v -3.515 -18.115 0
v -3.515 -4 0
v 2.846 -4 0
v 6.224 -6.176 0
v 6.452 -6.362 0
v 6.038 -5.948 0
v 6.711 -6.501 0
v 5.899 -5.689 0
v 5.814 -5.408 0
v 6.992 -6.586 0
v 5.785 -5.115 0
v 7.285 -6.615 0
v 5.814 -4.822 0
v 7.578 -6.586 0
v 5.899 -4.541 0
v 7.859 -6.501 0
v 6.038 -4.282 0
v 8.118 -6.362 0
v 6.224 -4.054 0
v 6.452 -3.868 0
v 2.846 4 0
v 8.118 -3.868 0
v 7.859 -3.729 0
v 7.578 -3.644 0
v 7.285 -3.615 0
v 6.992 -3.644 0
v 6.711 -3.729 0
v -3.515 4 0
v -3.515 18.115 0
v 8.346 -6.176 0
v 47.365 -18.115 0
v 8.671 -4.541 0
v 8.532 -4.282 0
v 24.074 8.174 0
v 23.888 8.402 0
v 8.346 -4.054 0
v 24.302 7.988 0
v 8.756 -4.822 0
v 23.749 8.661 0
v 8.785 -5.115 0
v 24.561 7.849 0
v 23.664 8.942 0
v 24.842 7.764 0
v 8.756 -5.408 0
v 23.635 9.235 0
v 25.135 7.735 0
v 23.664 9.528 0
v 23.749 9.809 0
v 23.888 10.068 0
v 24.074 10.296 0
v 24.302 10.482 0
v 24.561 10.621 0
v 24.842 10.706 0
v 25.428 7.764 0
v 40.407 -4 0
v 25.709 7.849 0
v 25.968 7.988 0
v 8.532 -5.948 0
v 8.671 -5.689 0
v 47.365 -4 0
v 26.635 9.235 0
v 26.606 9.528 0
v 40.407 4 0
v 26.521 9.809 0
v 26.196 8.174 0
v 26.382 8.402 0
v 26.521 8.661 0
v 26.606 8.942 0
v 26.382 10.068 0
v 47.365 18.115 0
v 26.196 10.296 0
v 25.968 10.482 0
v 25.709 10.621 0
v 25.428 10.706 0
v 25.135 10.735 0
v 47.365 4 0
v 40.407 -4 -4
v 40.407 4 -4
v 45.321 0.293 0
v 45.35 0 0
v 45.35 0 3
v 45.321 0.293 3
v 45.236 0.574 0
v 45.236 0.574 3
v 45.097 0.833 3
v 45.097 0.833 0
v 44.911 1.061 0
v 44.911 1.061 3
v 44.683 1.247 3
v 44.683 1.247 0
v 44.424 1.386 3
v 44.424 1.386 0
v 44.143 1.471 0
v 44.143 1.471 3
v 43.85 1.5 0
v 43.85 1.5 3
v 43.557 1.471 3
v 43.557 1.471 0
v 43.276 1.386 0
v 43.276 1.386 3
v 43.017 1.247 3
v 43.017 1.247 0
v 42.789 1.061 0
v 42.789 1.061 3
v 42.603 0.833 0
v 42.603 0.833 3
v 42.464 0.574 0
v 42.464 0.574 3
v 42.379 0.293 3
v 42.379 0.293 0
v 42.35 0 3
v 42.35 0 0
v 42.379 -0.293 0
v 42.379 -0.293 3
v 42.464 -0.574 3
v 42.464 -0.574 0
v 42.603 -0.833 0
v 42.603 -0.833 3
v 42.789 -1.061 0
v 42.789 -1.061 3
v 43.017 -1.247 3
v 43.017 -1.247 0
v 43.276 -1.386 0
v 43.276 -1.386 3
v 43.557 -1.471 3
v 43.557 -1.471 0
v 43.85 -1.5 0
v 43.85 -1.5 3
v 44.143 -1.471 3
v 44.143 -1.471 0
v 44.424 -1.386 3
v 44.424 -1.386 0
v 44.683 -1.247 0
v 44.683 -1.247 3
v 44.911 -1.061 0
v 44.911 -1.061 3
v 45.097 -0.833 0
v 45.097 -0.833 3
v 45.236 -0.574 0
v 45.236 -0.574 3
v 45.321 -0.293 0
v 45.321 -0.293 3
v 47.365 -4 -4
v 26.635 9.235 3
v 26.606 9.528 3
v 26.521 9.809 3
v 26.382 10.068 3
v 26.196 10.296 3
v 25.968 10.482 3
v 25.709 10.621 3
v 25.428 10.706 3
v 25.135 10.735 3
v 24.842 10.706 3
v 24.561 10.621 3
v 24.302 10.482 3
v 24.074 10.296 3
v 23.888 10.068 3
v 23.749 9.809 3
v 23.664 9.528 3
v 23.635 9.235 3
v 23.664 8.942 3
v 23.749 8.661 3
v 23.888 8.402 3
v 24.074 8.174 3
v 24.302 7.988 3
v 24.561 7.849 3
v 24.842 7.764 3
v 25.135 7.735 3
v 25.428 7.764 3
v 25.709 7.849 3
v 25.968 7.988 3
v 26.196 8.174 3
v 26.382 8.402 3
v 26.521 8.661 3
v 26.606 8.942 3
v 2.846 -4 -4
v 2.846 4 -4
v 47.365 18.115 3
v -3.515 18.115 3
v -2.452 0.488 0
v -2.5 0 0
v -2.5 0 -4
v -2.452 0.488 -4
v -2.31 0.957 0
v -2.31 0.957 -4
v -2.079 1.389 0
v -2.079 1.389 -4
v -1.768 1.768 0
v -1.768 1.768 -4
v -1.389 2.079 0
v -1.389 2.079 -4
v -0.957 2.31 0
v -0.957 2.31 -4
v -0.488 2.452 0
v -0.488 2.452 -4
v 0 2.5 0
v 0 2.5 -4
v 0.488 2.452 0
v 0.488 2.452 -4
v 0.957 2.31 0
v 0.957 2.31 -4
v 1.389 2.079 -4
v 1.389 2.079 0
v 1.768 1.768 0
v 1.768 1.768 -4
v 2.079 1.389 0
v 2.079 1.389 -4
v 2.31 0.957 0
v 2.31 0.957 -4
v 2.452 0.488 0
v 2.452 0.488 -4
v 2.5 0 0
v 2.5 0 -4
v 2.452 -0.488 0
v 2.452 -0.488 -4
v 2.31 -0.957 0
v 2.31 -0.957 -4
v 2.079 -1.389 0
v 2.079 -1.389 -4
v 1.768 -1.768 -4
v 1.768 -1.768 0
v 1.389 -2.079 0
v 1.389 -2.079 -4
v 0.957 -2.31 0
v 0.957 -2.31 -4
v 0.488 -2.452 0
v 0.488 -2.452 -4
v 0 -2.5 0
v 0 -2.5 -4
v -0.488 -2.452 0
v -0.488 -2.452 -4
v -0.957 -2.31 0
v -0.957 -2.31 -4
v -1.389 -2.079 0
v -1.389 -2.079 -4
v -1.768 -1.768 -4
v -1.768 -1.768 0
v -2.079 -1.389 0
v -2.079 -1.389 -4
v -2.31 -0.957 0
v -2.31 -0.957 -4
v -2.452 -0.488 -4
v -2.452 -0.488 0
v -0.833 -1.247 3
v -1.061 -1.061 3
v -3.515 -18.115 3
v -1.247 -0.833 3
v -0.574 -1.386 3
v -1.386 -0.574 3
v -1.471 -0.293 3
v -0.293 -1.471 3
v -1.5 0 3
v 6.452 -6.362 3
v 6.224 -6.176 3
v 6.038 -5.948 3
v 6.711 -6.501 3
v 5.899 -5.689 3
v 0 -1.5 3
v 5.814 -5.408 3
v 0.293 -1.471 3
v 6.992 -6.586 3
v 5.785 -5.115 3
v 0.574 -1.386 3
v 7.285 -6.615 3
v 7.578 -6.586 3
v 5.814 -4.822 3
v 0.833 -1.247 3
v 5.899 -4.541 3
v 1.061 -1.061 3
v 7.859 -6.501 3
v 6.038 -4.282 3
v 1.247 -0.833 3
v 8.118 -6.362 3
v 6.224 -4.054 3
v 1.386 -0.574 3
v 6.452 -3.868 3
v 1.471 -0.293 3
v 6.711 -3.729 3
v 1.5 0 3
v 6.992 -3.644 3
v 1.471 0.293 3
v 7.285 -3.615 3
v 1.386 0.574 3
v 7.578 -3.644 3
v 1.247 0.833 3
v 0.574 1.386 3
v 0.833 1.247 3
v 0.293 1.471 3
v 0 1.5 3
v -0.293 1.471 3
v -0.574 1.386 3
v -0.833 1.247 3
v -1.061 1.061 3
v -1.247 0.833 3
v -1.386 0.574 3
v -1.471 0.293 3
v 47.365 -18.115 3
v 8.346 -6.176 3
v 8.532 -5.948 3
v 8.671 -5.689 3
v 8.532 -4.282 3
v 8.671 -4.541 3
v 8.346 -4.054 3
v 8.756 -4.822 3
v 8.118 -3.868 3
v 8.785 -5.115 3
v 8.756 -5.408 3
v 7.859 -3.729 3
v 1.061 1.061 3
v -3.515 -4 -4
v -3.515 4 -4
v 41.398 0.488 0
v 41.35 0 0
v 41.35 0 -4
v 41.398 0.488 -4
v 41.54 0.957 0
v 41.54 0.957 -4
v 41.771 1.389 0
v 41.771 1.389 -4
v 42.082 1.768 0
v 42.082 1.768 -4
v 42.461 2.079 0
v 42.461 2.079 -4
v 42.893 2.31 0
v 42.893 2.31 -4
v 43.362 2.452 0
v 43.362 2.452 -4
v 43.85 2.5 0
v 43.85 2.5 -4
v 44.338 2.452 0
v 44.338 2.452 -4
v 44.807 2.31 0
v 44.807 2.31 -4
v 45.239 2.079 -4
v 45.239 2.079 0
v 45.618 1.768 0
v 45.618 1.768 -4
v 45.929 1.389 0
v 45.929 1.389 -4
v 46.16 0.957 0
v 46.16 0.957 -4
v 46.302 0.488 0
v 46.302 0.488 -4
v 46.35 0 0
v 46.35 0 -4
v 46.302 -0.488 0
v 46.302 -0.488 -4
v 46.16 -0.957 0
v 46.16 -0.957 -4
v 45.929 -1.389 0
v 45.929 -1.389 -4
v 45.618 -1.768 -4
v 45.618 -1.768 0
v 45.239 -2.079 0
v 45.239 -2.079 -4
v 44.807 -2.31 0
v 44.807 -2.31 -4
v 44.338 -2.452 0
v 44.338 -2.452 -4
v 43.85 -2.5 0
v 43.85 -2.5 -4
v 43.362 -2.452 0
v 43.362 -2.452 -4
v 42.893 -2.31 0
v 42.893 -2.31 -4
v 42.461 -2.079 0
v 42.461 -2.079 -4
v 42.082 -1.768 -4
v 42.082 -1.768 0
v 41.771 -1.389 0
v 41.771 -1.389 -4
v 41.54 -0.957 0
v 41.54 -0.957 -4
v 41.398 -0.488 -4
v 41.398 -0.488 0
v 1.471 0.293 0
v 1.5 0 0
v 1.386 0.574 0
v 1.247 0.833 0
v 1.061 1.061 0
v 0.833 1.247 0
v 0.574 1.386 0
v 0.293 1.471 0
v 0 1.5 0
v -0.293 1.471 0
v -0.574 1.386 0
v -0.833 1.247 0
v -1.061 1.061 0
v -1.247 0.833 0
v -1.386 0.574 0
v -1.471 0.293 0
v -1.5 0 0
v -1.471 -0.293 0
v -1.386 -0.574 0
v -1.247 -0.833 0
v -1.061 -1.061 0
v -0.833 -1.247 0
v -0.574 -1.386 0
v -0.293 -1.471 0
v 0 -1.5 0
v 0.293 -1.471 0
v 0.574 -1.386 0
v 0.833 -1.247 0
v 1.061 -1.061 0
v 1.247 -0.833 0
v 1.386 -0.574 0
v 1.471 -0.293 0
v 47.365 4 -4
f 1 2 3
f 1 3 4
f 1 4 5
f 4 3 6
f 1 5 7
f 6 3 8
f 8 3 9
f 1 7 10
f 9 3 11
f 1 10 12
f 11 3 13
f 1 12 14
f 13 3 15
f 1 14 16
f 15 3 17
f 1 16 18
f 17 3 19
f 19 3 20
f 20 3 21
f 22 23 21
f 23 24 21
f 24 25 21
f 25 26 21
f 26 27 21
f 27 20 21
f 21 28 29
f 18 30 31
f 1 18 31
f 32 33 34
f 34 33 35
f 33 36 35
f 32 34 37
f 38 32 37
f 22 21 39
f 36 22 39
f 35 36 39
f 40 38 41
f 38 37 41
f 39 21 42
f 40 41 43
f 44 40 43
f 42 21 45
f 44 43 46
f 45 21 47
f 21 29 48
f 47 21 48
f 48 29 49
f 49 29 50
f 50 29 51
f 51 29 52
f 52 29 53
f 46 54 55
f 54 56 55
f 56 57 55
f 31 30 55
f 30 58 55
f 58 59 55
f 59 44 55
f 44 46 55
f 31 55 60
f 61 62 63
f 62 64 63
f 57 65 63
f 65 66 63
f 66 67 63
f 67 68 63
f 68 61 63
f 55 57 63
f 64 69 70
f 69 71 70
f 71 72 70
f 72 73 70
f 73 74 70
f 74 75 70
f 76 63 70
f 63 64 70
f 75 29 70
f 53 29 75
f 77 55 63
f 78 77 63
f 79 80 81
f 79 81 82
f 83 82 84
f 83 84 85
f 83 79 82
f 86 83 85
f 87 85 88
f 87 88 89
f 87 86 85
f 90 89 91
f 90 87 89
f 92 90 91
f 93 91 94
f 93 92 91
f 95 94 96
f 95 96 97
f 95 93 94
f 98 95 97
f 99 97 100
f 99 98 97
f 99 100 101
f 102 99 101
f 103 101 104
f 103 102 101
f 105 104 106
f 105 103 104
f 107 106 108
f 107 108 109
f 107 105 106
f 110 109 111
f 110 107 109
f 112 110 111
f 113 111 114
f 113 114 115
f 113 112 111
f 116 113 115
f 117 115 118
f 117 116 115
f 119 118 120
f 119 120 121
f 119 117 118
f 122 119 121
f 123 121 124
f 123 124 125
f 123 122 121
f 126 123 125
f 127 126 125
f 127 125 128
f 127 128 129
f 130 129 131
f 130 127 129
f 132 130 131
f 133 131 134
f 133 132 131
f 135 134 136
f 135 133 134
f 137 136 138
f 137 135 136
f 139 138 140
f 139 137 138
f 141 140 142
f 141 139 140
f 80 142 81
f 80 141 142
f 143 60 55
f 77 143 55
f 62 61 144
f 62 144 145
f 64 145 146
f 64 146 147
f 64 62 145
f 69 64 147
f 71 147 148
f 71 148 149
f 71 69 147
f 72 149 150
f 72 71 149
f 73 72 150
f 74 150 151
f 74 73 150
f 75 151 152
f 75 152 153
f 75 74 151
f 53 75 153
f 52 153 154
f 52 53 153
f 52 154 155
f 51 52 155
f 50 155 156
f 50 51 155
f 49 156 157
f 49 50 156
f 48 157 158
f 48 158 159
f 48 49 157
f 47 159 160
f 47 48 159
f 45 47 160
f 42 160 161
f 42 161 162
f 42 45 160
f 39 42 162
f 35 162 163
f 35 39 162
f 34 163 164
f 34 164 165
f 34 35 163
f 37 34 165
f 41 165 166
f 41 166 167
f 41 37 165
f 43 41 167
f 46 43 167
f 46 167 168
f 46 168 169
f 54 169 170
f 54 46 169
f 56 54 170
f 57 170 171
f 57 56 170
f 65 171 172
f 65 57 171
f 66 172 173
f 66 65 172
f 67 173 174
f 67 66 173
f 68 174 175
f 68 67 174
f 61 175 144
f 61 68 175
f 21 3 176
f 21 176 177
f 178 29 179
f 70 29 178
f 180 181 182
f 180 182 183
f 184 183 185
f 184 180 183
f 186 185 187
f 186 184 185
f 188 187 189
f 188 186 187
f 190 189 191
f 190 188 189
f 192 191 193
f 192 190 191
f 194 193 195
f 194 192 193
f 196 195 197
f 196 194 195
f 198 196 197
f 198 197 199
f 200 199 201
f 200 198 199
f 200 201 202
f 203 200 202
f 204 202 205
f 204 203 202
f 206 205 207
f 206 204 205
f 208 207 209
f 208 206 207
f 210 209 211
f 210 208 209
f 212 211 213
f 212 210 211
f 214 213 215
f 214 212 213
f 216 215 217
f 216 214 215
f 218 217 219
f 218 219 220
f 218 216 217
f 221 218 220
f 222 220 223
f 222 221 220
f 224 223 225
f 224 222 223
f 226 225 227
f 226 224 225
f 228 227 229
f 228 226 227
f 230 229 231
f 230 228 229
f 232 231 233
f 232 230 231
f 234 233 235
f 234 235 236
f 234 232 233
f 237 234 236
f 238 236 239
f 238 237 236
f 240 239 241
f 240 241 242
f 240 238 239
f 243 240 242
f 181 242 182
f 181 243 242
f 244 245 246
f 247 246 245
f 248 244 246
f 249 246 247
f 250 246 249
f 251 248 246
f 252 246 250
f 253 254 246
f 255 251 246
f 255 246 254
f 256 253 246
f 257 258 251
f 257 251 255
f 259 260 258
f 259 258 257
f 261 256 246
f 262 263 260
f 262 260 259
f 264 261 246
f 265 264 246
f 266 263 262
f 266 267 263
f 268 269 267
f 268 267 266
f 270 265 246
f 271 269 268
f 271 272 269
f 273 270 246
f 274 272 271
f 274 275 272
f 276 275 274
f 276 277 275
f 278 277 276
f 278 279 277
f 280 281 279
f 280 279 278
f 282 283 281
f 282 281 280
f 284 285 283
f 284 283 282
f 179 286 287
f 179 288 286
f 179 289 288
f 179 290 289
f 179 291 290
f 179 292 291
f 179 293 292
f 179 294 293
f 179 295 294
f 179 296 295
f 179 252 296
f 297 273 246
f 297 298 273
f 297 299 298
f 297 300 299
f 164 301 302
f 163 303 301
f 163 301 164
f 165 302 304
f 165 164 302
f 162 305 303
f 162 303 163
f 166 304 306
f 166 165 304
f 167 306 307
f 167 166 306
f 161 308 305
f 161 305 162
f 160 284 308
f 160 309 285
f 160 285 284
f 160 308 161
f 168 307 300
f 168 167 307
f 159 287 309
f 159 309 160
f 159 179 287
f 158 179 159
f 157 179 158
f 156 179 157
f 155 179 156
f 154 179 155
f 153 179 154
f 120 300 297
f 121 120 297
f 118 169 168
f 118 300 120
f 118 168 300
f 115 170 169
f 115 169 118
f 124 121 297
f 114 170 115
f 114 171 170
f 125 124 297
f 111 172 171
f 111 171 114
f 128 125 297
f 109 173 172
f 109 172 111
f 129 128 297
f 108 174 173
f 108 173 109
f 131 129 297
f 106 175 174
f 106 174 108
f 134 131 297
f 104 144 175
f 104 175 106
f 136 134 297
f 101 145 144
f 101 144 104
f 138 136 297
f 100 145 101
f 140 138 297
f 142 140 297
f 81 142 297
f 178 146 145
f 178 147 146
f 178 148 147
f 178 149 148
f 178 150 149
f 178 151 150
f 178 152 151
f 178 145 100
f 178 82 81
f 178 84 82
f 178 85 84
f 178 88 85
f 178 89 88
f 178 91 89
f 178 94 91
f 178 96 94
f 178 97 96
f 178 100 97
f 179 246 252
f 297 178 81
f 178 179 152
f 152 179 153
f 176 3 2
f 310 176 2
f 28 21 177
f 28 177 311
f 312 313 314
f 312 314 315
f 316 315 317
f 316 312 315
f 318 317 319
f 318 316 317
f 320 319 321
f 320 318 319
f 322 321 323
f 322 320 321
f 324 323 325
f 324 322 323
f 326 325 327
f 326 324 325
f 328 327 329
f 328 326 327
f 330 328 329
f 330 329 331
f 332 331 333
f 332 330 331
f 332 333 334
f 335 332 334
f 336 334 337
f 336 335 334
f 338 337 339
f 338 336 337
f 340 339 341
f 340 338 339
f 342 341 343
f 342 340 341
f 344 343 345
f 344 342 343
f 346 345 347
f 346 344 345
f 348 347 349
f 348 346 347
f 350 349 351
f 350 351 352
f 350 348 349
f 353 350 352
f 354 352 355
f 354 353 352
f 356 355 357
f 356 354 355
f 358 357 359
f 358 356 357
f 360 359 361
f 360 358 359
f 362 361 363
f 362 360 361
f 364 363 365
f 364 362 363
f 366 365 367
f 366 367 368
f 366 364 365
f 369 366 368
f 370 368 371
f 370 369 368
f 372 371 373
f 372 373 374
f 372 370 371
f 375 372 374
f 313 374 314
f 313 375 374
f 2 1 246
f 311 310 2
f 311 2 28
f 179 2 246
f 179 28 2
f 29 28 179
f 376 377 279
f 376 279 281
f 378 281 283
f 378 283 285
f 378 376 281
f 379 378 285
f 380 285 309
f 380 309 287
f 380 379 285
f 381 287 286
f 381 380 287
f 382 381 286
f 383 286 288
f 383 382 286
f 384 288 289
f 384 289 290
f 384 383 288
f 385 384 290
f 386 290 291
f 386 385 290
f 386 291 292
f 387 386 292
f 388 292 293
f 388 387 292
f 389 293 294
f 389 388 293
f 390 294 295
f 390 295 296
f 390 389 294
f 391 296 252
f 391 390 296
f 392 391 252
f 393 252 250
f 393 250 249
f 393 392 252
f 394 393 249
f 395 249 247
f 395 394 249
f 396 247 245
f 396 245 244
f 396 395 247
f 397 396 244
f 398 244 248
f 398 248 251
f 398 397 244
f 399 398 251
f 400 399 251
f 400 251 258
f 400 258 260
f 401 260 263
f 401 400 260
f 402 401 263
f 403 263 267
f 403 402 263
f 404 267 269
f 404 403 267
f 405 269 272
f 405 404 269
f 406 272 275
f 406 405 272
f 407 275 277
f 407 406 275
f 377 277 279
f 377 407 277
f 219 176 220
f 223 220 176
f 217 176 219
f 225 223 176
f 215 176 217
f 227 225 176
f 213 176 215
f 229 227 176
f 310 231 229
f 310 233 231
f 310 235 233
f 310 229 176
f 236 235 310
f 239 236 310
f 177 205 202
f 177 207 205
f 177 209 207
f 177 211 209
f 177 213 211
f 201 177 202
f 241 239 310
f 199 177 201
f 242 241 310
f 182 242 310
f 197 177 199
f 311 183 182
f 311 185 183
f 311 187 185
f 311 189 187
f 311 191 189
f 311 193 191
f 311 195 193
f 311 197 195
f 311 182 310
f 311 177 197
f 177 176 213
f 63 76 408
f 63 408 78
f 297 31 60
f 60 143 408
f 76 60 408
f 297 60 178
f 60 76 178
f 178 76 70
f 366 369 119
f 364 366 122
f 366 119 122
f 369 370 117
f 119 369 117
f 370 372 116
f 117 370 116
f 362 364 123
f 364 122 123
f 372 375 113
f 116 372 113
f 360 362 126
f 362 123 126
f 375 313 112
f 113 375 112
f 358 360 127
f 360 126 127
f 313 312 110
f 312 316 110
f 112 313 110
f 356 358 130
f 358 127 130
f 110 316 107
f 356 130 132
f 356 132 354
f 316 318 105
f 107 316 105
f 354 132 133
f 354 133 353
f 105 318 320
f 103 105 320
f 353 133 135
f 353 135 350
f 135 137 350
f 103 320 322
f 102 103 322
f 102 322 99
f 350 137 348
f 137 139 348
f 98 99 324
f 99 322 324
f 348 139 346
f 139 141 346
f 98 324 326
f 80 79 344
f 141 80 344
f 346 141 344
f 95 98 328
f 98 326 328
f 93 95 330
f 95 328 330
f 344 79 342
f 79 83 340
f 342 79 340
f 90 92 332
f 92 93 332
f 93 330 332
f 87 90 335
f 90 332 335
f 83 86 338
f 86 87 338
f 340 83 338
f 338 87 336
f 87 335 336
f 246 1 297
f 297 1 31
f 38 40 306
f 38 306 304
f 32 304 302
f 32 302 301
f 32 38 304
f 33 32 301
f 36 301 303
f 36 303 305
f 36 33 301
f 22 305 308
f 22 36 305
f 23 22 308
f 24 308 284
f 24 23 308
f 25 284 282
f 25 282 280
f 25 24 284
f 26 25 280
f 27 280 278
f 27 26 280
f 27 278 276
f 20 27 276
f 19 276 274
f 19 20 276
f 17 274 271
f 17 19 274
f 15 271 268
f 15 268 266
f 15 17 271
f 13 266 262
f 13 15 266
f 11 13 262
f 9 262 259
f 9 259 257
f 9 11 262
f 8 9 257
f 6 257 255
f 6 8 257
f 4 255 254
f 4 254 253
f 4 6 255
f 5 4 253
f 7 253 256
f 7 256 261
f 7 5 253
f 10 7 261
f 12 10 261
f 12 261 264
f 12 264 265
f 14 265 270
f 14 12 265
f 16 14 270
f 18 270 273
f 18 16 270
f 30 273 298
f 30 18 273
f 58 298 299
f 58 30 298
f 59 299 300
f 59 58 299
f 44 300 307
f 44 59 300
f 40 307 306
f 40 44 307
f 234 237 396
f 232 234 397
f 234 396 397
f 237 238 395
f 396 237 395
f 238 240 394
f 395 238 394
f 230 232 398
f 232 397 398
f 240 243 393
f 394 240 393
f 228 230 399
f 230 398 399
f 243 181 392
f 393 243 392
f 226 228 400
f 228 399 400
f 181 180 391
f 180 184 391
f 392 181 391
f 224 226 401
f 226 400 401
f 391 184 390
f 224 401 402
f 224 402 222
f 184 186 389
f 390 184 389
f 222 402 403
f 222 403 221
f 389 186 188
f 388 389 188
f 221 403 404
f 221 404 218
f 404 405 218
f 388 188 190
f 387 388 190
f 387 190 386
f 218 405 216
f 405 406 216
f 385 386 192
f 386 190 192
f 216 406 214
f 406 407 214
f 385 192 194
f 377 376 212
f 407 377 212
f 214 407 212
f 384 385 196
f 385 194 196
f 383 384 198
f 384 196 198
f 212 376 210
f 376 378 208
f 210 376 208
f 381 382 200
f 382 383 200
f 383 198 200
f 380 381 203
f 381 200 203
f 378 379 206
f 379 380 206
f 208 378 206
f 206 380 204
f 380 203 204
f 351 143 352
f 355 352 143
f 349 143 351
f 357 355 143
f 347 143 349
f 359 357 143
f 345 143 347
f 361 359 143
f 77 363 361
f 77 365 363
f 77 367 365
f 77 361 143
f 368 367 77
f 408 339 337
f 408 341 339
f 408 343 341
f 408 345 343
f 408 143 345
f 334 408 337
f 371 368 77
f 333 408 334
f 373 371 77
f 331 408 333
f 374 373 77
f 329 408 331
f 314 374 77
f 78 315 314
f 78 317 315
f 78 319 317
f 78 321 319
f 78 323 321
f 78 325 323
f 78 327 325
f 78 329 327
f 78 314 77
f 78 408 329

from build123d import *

# Parameters (mm, degrees)
SKETCH_1_W      = 50.88
SKETCH_1_H      = 36.23
SKETCH_1_R      = 1.5
EXTRUDE_1_DEPTH = 3
SKETCH_2_W      = 6.361490509
SKETCH_2_H      = 8
SKETCH_2_R      = 2.5
SKETCH_2_W_2    = 6.95769393
EXTRUDE_2_DEPTH = 4


with BuildPart() as part:
    # 草图1 → 凸台-拉伸1 (new body)
    with BuildSketch(Plane.XY):
        with Locations((21.925, 0)):
            Rectangle(SKETCH_1_W, SKETCH_1_H)
        Circle(SKETCH_1_R, mode=Mode.SUBTRACT)
        with Locations((43.85, 0)):
            Circle(SKETCH_1_R, mode=Mode.SUBTRACT)
        with Locations((7.285, -5.115)):
            Circle(SKETCH_1_R, mode=Mode.SUBTRACT)
        with Locations((25.135, 9.235)):
            Circle(SKETCH_1_R, mode=Mode.SUBTRACT)
    extrude(amount=EXTRUDE_1_DEPTH)

    # 草图2 → 凸台-拉伸2 (add)
    # profile 1 of 2: a face of its own
    with BuildSketch(Plane(origin=(0, 0, 0), x_dir=(-1, 0, 0), z_dir=(0, 0, -1))):
        with Locations((0.334254746, 0)):
            Rectangle(SKETCH_2_W, SKETCH_2_H)
        Circle(SKETCH_2_R, mode=Mode.SUBTRACT)
    # profile 2 of 2: a face of its own
    with BuildSketch(Plane(origin=(0, 0, 0), x_dir=(-1, 0, 0), z_dir=(0, 0, -1))):
        with Locations((-43.886153035, 0)):
            Rectangle(SKETCH_2_W_2, SKETCH_2_H)
        with Locations((-43.85, 0)):
            Circle(SKETCH_2_R, mode=Mode.SUBTRACT)
    extrude(amount=EXTRUDE_2_DEPTH)


solid = part.part
